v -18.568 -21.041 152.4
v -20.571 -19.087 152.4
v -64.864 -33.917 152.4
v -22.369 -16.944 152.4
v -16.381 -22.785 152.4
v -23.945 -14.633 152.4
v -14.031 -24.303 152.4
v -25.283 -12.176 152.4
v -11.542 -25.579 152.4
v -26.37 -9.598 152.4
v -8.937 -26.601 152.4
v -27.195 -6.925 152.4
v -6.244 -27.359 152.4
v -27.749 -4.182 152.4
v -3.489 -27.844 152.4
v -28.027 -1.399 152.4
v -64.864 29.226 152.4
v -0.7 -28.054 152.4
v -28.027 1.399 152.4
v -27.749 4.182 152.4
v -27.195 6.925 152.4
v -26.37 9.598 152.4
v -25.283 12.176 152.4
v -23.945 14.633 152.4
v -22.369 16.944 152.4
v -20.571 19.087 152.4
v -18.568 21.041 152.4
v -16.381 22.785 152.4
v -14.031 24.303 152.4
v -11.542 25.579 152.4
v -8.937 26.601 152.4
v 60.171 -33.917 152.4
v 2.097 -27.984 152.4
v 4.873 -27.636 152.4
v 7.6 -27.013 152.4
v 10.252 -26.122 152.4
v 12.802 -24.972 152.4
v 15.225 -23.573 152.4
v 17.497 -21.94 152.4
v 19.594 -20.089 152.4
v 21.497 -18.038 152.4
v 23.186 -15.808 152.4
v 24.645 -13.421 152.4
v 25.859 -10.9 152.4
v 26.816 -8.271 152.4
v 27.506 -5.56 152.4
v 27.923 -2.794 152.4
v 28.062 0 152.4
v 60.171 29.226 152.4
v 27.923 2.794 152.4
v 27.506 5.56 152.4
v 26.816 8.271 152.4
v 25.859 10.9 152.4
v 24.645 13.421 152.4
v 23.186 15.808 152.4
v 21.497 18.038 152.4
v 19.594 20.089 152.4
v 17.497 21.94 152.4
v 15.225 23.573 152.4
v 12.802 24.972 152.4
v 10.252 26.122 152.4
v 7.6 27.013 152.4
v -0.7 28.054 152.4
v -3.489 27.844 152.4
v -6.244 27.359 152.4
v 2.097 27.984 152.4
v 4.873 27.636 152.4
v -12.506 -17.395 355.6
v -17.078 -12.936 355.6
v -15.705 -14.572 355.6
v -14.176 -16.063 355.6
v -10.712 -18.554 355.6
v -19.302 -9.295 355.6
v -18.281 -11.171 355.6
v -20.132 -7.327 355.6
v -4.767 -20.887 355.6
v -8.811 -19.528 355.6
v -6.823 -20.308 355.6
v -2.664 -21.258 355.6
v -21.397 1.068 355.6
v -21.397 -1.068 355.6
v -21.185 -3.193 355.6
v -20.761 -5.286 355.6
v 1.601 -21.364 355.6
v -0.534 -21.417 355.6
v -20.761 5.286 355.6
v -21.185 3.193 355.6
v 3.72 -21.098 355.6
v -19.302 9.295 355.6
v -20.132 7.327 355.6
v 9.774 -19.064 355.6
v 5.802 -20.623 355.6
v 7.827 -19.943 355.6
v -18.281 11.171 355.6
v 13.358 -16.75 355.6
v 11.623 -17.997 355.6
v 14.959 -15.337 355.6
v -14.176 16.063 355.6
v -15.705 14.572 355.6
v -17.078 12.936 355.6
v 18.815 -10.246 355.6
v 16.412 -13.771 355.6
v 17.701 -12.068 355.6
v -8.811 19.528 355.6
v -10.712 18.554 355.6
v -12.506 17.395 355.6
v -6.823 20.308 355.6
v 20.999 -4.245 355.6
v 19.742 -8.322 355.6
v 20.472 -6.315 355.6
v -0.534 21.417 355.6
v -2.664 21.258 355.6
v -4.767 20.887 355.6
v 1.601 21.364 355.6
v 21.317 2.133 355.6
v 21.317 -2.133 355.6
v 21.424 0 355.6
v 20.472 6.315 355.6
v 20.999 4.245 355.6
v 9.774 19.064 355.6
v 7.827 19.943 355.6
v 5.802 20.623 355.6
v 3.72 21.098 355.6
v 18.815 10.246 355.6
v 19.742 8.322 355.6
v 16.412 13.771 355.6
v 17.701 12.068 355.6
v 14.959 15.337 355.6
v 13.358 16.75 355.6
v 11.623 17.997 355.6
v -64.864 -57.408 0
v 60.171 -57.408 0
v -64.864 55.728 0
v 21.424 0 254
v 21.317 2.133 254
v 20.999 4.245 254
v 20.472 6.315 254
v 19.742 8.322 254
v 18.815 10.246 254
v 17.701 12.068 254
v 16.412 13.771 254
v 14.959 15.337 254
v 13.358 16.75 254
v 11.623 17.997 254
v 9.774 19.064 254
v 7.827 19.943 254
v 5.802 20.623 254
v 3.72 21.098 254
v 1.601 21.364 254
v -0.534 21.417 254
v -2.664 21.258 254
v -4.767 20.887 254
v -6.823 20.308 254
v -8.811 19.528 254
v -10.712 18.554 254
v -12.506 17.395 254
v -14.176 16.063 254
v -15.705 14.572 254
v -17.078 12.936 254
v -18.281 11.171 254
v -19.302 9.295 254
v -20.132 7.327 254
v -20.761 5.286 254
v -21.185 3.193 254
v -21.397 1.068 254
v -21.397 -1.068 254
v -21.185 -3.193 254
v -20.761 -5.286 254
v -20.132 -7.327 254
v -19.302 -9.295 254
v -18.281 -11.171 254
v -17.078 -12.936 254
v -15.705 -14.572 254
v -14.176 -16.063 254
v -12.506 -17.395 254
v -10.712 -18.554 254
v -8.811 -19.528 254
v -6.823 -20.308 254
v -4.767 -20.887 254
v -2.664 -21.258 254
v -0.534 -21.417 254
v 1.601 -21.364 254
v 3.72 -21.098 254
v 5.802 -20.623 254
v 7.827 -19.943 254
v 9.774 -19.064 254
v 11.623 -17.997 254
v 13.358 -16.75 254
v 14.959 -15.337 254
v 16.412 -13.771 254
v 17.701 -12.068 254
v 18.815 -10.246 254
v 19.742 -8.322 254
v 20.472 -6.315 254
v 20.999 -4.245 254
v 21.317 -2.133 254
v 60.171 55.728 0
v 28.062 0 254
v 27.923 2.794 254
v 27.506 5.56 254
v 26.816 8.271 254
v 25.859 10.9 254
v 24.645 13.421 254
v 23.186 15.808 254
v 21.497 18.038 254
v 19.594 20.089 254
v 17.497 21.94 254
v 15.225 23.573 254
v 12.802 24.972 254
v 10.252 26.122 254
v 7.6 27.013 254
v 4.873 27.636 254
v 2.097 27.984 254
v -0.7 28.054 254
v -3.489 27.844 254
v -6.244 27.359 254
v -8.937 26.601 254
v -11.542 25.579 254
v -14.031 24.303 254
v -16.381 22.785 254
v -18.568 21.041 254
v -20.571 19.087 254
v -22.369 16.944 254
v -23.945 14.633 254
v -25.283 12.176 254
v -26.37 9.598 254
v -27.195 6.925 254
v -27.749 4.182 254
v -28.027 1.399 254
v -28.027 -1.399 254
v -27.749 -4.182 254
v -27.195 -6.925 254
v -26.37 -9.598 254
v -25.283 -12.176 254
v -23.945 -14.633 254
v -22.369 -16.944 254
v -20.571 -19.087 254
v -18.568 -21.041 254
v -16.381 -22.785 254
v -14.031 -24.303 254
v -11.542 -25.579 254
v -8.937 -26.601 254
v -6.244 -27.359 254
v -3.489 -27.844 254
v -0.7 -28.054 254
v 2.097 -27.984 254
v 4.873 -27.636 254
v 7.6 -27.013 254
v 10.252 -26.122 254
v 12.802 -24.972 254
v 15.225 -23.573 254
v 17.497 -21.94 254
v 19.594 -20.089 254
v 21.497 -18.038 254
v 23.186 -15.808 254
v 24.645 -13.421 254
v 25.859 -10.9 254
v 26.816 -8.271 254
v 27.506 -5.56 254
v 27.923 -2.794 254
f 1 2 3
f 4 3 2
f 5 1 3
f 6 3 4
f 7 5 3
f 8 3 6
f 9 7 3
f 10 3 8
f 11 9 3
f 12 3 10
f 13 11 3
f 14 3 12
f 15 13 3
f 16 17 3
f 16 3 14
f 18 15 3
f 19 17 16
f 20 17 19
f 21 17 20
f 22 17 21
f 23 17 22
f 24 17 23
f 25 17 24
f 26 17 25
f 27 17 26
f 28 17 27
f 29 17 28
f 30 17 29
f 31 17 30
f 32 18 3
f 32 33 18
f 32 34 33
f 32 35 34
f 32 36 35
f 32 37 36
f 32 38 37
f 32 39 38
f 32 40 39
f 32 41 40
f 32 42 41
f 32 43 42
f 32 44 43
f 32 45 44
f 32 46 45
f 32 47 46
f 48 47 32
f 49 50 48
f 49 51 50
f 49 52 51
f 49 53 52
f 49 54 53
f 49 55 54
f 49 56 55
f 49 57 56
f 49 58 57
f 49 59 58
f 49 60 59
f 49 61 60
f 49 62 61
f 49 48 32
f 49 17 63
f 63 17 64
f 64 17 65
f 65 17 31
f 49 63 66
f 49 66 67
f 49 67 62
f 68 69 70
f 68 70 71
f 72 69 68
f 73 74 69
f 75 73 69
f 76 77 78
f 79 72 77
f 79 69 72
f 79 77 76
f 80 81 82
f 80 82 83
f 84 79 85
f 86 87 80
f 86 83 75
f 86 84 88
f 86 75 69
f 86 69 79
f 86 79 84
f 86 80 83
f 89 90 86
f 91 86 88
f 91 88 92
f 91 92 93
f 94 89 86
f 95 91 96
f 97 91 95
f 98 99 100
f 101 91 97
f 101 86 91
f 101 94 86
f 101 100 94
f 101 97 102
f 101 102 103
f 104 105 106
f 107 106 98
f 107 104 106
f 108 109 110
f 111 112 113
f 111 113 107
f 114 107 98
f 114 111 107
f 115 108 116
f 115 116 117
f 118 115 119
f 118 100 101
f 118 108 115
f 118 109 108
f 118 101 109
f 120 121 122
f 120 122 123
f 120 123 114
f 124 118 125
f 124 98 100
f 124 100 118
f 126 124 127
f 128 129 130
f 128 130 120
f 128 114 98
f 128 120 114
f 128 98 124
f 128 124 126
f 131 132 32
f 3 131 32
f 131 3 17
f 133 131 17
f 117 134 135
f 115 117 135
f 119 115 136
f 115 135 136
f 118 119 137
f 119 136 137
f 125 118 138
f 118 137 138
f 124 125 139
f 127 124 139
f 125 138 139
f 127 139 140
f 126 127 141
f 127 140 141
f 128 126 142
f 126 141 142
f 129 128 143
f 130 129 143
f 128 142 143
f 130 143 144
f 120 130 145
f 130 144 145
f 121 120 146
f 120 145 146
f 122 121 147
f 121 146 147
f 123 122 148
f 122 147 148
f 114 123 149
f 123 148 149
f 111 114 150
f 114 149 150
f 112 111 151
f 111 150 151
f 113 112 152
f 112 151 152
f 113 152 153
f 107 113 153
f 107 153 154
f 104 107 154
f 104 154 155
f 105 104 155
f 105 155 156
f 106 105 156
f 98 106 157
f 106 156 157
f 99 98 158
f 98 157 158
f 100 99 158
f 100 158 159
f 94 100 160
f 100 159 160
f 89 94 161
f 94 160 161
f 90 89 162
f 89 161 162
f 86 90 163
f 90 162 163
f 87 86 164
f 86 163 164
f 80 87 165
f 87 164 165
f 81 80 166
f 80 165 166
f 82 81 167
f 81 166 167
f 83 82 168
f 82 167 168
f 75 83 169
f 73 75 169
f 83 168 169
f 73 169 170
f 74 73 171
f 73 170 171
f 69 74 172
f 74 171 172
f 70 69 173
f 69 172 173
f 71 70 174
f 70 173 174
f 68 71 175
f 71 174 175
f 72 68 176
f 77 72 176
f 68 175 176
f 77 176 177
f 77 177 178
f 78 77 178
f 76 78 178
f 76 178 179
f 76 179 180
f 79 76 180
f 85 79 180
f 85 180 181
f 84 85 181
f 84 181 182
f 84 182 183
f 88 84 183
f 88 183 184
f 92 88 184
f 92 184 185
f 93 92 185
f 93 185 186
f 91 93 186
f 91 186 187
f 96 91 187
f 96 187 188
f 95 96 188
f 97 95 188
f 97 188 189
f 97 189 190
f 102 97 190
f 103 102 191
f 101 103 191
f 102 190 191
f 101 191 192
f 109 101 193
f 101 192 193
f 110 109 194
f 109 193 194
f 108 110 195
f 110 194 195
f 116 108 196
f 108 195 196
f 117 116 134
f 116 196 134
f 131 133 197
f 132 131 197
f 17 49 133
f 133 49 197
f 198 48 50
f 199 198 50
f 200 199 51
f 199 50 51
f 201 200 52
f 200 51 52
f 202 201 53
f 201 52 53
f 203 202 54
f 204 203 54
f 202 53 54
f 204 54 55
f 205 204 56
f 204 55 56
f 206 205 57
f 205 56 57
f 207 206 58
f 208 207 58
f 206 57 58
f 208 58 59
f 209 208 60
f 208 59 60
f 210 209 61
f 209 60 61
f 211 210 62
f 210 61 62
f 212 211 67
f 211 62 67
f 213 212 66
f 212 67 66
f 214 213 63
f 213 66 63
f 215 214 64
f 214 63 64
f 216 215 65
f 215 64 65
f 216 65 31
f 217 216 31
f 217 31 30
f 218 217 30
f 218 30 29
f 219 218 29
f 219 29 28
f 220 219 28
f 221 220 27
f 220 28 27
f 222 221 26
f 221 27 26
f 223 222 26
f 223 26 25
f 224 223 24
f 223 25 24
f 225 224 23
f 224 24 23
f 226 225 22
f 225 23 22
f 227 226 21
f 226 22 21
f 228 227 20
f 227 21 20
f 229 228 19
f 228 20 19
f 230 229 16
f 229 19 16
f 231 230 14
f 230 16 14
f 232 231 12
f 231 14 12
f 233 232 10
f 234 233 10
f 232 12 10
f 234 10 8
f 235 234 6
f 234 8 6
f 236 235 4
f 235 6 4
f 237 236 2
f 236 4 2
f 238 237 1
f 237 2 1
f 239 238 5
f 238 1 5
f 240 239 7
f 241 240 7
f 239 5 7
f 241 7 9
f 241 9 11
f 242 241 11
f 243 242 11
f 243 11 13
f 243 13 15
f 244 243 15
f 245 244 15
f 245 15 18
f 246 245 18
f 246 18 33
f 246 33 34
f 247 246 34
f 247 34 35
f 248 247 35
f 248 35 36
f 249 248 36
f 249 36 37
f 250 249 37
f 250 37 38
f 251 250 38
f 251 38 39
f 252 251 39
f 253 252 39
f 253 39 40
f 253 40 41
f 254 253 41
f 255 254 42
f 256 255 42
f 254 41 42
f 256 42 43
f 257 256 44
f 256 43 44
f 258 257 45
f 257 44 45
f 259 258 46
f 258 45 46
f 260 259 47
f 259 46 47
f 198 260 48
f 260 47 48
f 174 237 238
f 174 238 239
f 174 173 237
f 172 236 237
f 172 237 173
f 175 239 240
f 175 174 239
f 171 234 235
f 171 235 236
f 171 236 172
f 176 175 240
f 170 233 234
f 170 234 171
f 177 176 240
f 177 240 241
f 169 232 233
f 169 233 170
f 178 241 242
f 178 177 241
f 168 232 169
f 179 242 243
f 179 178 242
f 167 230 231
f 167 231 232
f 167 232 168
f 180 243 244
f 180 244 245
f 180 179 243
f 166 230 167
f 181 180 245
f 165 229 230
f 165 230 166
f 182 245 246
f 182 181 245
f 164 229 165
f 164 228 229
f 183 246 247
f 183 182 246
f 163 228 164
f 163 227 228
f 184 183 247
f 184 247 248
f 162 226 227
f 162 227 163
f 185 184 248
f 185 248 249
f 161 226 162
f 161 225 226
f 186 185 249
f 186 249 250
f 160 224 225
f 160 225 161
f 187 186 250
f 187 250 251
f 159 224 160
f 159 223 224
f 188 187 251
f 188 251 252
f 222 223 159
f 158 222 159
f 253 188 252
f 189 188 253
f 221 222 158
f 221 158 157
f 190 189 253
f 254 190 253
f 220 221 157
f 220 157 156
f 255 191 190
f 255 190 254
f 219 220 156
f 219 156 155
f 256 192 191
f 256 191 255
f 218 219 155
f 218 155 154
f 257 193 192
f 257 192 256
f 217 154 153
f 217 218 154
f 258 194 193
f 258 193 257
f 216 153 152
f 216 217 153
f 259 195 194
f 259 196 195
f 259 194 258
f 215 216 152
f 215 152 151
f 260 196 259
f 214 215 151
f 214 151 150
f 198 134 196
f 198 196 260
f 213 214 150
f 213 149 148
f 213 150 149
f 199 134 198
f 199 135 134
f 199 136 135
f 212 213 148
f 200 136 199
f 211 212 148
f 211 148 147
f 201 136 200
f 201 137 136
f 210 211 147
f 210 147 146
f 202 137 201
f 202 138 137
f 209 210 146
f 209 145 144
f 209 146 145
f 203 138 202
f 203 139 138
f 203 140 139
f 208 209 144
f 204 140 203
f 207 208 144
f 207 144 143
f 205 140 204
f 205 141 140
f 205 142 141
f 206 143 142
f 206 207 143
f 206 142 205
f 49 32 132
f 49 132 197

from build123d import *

# Parameters (mm, degrees)
F0_W     = 125.034798
F0_H     = 113.135892
F1_DEPTH = 152.4
F3_DEPTH = 125.035798
F5_DEPTH = 125.035798
F6_R     = 28.062264
F7_DEPTH = 101.6
F8_R     = 21.423824
F9_DEPTH = 101.6


with BuildPart() as f1:
    # F0 (on Top) → F1 (new body)
    with BuildSketch(Plane.XY):
        with Locations((-2.346424, -0.839917)):
            Rectangle(F0_W, F0_H)
    extrude(amount=F1_DEPTH)

    # F2 (on face) → F3 (cut, through all)
    with BuildSketch(Plane.YZ.offset(60.170975)):
        Polygon((-57.407863, 152.4), (-57.407863, 0), (-33.916943, 152.4), align=None)
    extrude(amount=-F3_DEPTH, mode=Mode.SUBTRACT)

    # F4 (on face) → F5 (cut, through all)
    with BuildSketch(Plane.YZ.offset(60.170975)):
        Polygon((29.225653, 152.4), (55.728029, 0), (55.728029, 152.4), align=None)
    extrude(amount=-F5_DEPTH, mode=Mode.SUBTRACT)

    # F6 (on face) → F7 (join)
    with BuildSketch(Plane.XY.offset(152.4)):
        Circle(F6_R)
    extrude(amount=F7_DEPTH)

    # F8 (on face) → F9 (join)
    with BuildSketch(Plane.XY.offset(254)):
        Circle(F8_R)
    extrude(amount=F9_DEPTH)


solid = f1.part
